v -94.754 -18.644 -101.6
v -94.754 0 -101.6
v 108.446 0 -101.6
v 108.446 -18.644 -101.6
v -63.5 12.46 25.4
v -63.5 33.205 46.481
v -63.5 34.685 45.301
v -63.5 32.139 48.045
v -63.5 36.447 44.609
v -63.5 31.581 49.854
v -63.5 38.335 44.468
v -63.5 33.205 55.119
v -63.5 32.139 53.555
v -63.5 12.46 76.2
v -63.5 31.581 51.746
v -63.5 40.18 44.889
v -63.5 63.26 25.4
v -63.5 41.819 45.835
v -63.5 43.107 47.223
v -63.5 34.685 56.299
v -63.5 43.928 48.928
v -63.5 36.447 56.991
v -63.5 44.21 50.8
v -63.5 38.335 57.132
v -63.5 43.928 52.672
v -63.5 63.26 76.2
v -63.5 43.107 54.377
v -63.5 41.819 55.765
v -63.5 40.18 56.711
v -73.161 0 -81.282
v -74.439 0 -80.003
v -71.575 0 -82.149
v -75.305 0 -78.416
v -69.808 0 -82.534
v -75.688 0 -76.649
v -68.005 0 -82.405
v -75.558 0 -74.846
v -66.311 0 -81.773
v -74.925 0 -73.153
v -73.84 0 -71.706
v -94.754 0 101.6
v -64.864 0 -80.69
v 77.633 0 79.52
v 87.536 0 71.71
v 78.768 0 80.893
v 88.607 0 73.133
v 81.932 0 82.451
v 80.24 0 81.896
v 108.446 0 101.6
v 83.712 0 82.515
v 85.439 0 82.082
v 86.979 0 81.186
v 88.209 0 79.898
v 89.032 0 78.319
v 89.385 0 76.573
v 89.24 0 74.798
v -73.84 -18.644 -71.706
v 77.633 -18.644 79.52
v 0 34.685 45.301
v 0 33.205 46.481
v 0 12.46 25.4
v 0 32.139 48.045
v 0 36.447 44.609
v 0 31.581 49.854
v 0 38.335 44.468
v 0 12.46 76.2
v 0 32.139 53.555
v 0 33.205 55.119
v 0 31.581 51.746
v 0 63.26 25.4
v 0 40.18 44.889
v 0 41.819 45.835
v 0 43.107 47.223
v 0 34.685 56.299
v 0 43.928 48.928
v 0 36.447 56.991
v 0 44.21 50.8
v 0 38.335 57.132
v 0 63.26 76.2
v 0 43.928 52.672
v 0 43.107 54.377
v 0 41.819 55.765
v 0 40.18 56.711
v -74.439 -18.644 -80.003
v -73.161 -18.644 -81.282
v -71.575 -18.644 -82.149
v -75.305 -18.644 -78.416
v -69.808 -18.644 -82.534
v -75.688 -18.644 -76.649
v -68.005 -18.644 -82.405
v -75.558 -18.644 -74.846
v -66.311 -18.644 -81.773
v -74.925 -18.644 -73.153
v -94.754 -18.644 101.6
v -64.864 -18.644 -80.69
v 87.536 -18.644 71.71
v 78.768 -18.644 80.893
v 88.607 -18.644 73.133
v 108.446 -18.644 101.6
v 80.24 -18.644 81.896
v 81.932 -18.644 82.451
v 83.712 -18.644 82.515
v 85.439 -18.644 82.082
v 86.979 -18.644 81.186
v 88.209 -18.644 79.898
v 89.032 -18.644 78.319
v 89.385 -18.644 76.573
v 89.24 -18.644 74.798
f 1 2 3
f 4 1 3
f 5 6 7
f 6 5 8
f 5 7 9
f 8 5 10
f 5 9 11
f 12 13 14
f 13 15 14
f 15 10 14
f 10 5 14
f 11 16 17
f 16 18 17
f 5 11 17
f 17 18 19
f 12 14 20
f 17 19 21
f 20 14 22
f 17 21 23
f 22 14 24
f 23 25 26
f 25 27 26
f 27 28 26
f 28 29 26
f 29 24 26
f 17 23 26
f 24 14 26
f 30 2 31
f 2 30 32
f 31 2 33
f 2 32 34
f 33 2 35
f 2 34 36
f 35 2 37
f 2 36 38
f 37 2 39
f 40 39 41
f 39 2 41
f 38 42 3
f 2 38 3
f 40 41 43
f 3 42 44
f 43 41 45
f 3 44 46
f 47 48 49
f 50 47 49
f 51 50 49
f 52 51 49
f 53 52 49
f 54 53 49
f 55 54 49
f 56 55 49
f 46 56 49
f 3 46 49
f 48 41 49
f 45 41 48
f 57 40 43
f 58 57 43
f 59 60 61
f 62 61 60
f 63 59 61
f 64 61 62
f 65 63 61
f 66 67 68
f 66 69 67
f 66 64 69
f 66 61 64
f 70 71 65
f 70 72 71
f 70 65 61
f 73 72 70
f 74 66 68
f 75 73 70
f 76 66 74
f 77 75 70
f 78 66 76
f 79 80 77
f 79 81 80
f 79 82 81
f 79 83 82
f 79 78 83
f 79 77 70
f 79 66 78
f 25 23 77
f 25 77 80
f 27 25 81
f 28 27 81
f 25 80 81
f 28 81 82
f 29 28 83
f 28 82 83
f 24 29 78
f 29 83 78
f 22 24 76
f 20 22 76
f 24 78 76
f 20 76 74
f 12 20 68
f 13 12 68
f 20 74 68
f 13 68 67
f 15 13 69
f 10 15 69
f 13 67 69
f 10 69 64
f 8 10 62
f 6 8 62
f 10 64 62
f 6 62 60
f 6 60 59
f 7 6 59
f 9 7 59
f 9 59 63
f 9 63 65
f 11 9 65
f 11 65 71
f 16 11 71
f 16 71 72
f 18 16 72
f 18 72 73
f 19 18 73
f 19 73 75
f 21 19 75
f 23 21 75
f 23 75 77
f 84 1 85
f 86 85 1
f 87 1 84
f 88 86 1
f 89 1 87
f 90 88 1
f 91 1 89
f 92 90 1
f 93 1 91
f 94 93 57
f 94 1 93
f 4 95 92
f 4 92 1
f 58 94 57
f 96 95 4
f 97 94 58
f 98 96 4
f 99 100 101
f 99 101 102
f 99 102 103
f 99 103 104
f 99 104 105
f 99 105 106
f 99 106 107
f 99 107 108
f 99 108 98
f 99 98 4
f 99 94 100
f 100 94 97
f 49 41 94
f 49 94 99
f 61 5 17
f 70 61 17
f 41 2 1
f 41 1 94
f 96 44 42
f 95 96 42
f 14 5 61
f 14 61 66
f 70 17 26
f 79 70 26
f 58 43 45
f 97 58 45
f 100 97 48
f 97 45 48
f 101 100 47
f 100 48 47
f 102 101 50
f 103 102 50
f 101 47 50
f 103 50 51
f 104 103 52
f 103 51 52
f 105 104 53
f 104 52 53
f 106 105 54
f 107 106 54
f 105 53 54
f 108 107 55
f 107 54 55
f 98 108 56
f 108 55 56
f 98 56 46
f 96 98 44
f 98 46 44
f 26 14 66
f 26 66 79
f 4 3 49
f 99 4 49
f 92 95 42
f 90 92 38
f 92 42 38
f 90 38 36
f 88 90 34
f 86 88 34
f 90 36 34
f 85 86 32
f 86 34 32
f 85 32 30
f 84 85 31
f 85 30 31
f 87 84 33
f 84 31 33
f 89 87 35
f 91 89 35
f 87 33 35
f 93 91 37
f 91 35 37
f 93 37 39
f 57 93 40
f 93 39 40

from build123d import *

# Parameters (mm, degrees)
F0_W     = 203.2
F0_H     = 203.2
F1_DEPTH = 18.6436
F2_W     = 50.8
F2_H     = 50.8
F3_DEPTH = 63.5
F5_R     = 6.35
F4_DEPTH = 94.754728


with BuildPart() as f1:
    # F0 (on Front) → F1 (new body)
    with BuildSketch(Plane.XZ):
        with Locations((6.846272, 0)):
            Rectangle(F0_W, F0_H)
        with BuildLine():
            ThreePointArc((-64.8636, -80.690128), (-73.845689, -80.688294), (-73.840188, -71.706207))
            Line((-73.840188, -71.706207), (77.633491, 79.520287))
            ThreePointArc((77.633491, 79.520287), (86.978633, 81.185883), (87.5364, 71.709872))
            Line((87.5364, 71.709872), (-64.8636, -80.690128))
        make_face(mode=Mode.SUBTRACT)
    extrude(amount=F1_DEPTH)


with BuildPart() as f3:
    # F2 (on Right) → F3 (new body)
    with BuildSketch(Plane.YZ):
        with Locations((37.859976, 50.8)):
            Rectangle(F2_W, F2_H)
    extrude(amount=-F3_DEPTH)

    # F5 (on face) → F4 (cut, through all)
    with BuildSketch(Plane.YZ):
        with Locations((37.859976, 50.8)):
            Circle(F5_R)
    extrude(amount=-F4_DEPTH, mode=Mode.SUBTRACT)


solid = Compound([f1.part, f3.part])
